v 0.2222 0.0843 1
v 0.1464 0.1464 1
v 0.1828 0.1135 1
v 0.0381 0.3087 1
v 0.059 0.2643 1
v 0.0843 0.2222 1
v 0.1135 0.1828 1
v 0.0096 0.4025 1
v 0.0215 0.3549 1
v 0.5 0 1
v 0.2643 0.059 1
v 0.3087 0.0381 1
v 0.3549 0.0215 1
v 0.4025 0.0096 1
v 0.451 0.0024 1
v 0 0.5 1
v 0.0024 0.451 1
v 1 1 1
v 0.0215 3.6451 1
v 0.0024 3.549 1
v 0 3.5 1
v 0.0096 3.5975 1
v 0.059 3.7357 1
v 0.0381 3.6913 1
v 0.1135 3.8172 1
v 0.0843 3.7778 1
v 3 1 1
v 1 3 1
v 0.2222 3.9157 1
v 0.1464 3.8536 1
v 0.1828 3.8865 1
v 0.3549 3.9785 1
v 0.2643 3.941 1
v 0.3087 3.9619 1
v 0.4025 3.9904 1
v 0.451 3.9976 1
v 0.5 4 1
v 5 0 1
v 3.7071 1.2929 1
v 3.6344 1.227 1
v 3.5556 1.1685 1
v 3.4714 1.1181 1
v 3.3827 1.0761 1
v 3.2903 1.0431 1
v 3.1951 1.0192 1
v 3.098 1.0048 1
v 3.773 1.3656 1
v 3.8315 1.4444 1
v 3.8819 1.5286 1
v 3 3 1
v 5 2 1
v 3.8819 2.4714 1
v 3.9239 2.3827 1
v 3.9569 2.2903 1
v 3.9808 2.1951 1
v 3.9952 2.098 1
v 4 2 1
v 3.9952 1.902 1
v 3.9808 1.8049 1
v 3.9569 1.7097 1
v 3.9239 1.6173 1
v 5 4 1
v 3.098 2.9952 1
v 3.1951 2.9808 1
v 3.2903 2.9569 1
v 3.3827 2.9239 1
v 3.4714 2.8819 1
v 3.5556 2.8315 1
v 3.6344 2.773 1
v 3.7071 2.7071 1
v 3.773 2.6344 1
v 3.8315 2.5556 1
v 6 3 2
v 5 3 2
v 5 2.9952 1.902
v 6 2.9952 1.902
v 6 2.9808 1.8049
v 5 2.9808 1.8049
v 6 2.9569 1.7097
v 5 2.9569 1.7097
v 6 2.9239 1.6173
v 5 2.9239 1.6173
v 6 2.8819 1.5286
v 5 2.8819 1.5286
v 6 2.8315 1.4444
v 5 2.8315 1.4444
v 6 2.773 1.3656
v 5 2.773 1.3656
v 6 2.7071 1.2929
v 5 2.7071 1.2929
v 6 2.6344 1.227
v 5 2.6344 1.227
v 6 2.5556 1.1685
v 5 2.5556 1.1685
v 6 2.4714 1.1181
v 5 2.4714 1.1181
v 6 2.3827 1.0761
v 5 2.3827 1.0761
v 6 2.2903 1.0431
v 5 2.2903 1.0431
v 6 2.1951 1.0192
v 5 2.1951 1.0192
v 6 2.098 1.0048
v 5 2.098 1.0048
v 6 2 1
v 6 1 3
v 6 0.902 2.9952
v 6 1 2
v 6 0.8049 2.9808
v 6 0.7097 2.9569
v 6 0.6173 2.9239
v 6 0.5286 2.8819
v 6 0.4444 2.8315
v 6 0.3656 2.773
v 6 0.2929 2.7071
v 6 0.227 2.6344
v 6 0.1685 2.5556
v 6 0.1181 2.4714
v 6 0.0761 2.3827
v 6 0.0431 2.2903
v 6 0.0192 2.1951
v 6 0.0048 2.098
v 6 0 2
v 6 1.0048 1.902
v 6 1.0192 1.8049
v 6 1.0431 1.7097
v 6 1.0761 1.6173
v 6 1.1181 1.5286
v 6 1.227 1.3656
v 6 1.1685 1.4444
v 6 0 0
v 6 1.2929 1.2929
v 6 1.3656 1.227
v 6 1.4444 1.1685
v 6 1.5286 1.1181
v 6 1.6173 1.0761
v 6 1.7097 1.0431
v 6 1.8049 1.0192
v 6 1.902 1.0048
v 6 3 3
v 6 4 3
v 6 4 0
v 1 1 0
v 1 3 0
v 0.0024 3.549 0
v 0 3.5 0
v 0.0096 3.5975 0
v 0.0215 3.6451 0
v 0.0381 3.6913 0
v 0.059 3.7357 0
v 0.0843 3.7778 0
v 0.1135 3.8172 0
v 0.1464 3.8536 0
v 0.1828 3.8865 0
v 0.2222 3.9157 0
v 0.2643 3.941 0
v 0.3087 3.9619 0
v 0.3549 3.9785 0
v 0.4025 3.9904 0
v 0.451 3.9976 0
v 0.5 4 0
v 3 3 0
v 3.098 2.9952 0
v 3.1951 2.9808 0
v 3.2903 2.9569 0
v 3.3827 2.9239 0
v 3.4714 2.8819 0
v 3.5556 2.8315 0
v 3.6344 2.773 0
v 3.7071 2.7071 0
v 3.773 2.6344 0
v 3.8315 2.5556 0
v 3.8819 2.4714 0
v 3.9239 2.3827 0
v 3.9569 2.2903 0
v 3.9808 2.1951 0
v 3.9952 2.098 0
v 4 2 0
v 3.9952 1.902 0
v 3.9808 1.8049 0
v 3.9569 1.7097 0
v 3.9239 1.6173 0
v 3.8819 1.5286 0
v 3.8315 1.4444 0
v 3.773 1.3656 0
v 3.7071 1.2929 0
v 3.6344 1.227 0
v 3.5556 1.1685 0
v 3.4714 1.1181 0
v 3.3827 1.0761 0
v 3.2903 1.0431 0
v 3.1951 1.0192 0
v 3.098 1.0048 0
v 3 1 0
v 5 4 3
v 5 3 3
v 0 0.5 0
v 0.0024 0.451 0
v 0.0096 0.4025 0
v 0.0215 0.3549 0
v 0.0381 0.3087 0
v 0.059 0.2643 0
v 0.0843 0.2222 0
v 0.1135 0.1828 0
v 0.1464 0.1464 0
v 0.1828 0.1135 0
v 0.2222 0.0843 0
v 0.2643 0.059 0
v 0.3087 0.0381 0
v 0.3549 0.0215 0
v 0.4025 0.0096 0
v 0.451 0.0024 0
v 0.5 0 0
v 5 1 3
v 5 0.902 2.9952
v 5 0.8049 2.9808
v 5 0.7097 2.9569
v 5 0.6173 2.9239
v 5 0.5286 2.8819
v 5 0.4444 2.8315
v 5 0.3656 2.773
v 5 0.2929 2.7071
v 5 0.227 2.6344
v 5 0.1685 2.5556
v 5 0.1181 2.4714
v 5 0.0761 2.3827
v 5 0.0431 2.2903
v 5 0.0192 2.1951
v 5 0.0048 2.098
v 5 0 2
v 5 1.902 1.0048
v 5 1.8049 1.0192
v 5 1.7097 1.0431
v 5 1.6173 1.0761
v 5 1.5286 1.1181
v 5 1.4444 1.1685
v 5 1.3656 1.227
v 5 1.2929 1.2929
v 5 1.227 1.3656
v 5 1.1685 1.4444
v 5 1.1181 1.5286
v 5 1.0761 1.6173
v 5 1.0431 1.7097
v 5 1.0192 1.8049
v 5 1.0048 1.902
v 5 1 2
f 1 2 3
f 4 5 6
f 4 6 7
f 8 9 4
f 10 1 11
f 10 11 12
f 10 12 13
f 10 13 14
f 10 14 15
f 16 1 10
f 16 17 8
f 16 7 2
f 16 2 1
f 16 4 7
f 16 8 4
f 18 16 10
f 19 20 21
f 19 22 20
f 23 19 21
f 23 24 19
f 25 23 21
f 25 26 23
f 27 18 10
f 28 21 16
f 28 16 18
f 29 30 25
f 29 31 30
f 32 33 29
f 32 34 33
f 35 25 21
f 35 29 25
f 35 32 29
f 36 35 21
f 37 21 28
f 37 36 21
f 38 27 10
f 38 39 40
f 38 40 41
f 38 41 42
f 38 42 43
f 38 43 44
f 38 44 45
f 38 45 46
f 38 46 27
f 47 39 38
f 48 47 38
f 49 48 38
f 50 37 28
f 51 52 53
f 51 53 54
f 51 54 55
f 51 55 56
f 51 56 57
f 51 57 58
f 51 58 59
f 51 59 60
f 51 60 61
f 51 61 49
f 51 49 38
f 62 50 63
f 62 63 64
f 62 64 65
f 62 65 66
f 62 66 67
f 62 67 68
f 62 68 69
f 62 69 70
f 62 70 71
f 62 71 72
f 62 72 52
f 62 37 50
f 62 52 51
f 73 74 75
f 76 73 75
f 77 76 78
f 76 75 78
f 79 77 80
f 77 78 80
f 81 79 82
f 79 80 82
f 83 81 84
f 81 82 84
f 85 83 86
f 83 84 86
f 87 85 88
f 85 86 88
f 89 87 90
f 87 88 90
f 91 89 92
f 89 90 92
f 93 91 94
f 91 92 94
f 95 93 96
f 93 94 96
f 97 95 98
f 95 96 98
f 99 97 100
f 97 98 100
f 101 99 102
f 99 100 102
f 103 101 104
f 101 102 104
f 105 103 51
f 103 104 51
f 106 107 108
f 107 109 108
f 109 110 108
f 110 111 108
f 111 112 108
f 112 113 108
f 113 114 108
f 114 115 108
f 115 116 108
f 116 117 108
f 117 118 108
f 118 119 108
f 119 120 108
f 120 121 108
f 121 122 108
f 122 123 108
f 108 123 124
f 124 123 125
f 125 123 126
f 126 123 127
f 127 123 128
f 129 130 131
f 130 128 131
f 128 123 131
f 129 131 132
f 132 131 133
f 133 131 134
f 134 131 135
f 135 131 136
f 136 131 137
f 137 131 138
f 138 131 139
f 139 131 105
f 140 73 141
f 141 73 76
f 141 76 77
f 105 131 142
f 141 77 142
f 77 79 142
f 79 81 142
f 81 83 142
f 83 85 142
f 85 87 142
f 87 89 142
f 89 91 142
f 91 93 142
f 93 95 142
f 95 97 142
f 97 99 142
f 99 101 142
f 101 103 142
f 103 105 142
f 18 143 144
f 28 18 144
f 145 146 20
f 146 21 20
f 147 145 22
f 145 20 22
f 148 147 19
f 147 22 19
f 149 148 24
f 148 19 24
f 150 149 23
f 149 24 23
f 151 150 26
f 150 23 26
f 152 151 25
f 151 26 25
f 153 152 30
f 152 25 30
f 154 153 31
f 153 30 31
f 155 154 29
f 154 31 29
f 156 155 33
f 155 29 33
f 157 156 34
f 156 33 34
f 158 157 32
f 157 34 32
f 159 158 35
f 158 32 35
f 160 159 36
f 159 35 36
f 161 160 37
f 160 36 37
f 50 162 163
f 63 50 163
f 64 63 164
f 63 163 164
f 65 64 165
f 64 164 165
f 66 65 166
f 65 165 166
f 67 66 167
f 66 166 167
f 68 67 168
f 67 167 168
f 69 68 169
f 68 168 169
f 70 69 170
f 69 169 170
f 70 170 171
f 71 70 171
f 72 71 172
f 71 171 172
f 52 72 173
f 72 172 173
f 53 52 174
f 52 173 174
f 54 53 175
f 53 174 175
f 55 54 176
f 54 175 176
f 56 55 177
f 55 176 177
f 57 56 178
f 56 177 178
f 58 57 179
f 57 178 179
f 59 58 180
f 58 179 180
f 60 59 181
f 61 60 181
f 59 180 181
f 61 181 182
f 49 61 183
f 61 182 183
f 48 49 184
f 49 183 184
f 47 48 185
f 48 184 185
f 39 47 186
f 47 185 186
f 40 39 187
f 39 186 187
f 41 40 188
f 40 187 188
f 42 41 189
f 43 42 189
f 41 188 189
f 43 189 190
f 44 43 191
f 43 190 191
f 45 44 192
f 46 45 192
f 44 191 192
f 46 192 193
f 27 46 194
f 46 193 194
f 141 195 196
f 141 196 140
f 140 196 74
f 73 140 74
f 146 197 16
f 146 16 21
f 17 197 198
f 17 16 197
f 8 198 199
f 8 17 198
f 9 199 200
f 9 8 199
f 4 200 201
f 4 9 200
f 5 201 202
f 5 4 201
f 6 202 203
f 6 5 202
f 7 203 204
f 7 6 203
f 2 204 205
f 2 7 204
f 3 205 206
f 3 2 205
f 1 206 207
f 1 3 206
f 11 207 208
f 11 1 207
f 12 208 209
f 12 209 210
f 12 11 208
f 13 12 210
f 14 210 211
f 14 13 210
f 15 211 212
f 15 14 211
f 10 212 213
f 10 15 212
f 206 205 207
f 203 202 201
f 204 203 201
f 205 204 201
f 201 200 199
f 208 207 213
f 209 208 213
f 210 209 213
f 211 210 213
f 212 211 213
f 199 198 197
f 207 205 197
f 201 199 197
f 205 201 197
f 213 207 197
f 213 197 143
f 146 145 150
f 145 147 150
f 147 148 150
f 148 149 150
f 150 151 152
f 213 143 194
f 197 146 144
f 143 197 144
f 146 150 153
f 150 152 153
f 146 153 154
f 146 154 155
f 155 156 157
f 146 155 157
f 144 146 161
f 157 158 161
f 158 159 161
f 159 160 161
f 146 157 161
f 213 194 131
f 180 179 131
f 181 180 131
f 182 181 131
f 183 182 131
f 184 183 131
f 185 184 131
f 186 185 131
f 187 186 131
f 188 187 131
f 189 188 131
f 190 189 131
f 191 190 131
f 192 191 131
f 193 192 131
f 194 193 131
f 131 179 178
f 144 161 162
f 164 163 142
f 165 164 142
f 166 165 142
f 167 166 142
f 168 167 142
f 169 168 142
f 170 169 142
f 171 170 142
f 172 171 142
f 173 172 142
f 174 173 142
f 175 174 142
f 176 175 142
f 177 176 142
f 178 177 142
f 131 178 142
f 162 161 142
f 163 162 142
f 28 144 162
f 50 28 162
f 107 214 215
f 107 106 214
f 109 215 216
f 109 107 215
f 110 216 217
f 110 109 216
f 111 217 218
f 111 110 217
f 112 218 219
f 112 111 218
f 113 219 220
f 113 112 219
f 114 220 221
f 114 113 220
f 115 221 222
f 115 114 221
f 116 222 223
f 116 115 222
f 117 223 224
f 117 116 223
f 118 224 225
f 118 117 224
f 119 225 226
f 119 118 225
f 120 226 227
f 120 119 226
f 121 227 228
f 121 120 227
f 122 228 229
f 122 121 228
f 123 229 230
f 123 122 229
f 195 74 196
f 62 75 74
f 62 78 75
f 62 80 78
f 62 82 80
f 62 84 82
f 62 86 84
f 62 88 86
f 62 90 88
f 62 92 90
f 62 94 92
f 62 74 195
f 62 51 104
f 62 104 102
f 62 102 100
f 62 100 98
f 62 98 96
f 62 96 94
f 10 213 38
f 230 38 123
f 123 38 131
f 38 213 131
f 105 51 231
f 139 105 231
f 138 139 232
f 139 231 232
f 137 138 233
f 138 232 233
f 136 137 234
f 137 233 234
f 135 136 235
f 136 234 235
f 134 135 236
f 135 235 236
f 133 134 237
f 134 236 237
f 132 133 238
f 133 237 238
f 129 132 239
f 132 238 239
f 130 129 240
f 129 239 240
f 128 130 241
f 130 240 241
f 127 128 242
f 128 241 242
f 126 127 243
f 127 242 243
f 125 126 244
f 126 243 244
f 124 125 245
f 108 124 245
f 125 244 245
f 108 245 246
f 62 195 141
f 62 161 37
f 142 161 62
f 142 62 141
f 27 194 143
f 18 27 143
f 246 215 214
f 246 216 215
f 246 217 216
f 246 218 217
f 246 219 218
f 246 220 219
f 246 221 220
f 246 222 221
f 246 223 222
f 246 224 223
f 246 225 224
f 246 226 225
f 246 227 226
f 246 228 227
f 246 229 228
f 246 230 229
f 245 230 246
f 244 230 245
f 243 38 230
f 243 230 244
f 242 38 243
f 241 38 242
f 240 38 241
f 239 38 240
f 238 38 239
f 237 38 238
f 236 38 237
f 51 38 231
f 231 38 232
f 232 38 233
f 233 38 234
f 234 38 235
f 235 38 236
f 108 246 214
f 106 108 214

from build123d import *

# Parameters (mm, degrees)
F0_W     = 6
F0_H     = 4
F1_DEPTH = 1
F2_R     = 0.5
F3_W     = 1
F3_H     = 4
F4_DEPTH = 2
F5_R     = 1
F7_DEPTH = 25


with BuildPart() as f1:
    # F0 (on Top) → F1 (new body)
    with BuildSketch(Plane.XY):
        with Locations((3, 2)):
            Rectangle(F0_W, F0_H)
        with BuildLine():
            Line((3, 1), (1, 1))
            Line((1, 1), (1, 3))
            Line((1, 3), (3, 3))
            ThreePointArc((3, 3), (4, 2), (3, 1))
        make_face(mode=Mode.SUBTRACT)
    extrude(amount=F1_DEPTH)

    # F2
    f2_edges = [f1.edges().sort_by_distance(p)[0] for p in [
        (0, 0, 0.5),
        (0, 4, 0.5),
    ]]
    fillet(f2_edges, radius=F2_R)

    # F3 (on face) → F4 (join)
    with BuildSketch(Plane.XY.offset(1)):
        with Locations((5.5, 2)):
            Rectangle(F3_W, F3_H)
    extrude(amount=F4_DEPTH)

    # F5
    f5_edges = [f1.edges().sort_by_distance(p)[0] for p in [
        (5.5, 0, 3),
    ]]
    fillet(f5_edges, radius=F5_R)

    # F6 (on face) → F7 (cut)
    with BuildSketch(Plane(origin=(5, 0, 0), x_dir=(0, -1, 0), z_dir=(-1, 0, 0))):
        with BuildLine():
            Line((-1, 3), (-3, 3))
            Line((-3, 3), (-3, 2))
            ThreePointArc((-3, 2), (-2.7071067812, 1.2928932188), (-2, 1))
            ThreePointArc((-2, 1), (-1.2928932188, 1.2928932188), (-1, 2))
            Line((-1, 2), (-1, 3))
        make_face()
    extrude(amount=-F7_DEPTH, mode=Mode.SUBTRACT)


solid = f1.part
